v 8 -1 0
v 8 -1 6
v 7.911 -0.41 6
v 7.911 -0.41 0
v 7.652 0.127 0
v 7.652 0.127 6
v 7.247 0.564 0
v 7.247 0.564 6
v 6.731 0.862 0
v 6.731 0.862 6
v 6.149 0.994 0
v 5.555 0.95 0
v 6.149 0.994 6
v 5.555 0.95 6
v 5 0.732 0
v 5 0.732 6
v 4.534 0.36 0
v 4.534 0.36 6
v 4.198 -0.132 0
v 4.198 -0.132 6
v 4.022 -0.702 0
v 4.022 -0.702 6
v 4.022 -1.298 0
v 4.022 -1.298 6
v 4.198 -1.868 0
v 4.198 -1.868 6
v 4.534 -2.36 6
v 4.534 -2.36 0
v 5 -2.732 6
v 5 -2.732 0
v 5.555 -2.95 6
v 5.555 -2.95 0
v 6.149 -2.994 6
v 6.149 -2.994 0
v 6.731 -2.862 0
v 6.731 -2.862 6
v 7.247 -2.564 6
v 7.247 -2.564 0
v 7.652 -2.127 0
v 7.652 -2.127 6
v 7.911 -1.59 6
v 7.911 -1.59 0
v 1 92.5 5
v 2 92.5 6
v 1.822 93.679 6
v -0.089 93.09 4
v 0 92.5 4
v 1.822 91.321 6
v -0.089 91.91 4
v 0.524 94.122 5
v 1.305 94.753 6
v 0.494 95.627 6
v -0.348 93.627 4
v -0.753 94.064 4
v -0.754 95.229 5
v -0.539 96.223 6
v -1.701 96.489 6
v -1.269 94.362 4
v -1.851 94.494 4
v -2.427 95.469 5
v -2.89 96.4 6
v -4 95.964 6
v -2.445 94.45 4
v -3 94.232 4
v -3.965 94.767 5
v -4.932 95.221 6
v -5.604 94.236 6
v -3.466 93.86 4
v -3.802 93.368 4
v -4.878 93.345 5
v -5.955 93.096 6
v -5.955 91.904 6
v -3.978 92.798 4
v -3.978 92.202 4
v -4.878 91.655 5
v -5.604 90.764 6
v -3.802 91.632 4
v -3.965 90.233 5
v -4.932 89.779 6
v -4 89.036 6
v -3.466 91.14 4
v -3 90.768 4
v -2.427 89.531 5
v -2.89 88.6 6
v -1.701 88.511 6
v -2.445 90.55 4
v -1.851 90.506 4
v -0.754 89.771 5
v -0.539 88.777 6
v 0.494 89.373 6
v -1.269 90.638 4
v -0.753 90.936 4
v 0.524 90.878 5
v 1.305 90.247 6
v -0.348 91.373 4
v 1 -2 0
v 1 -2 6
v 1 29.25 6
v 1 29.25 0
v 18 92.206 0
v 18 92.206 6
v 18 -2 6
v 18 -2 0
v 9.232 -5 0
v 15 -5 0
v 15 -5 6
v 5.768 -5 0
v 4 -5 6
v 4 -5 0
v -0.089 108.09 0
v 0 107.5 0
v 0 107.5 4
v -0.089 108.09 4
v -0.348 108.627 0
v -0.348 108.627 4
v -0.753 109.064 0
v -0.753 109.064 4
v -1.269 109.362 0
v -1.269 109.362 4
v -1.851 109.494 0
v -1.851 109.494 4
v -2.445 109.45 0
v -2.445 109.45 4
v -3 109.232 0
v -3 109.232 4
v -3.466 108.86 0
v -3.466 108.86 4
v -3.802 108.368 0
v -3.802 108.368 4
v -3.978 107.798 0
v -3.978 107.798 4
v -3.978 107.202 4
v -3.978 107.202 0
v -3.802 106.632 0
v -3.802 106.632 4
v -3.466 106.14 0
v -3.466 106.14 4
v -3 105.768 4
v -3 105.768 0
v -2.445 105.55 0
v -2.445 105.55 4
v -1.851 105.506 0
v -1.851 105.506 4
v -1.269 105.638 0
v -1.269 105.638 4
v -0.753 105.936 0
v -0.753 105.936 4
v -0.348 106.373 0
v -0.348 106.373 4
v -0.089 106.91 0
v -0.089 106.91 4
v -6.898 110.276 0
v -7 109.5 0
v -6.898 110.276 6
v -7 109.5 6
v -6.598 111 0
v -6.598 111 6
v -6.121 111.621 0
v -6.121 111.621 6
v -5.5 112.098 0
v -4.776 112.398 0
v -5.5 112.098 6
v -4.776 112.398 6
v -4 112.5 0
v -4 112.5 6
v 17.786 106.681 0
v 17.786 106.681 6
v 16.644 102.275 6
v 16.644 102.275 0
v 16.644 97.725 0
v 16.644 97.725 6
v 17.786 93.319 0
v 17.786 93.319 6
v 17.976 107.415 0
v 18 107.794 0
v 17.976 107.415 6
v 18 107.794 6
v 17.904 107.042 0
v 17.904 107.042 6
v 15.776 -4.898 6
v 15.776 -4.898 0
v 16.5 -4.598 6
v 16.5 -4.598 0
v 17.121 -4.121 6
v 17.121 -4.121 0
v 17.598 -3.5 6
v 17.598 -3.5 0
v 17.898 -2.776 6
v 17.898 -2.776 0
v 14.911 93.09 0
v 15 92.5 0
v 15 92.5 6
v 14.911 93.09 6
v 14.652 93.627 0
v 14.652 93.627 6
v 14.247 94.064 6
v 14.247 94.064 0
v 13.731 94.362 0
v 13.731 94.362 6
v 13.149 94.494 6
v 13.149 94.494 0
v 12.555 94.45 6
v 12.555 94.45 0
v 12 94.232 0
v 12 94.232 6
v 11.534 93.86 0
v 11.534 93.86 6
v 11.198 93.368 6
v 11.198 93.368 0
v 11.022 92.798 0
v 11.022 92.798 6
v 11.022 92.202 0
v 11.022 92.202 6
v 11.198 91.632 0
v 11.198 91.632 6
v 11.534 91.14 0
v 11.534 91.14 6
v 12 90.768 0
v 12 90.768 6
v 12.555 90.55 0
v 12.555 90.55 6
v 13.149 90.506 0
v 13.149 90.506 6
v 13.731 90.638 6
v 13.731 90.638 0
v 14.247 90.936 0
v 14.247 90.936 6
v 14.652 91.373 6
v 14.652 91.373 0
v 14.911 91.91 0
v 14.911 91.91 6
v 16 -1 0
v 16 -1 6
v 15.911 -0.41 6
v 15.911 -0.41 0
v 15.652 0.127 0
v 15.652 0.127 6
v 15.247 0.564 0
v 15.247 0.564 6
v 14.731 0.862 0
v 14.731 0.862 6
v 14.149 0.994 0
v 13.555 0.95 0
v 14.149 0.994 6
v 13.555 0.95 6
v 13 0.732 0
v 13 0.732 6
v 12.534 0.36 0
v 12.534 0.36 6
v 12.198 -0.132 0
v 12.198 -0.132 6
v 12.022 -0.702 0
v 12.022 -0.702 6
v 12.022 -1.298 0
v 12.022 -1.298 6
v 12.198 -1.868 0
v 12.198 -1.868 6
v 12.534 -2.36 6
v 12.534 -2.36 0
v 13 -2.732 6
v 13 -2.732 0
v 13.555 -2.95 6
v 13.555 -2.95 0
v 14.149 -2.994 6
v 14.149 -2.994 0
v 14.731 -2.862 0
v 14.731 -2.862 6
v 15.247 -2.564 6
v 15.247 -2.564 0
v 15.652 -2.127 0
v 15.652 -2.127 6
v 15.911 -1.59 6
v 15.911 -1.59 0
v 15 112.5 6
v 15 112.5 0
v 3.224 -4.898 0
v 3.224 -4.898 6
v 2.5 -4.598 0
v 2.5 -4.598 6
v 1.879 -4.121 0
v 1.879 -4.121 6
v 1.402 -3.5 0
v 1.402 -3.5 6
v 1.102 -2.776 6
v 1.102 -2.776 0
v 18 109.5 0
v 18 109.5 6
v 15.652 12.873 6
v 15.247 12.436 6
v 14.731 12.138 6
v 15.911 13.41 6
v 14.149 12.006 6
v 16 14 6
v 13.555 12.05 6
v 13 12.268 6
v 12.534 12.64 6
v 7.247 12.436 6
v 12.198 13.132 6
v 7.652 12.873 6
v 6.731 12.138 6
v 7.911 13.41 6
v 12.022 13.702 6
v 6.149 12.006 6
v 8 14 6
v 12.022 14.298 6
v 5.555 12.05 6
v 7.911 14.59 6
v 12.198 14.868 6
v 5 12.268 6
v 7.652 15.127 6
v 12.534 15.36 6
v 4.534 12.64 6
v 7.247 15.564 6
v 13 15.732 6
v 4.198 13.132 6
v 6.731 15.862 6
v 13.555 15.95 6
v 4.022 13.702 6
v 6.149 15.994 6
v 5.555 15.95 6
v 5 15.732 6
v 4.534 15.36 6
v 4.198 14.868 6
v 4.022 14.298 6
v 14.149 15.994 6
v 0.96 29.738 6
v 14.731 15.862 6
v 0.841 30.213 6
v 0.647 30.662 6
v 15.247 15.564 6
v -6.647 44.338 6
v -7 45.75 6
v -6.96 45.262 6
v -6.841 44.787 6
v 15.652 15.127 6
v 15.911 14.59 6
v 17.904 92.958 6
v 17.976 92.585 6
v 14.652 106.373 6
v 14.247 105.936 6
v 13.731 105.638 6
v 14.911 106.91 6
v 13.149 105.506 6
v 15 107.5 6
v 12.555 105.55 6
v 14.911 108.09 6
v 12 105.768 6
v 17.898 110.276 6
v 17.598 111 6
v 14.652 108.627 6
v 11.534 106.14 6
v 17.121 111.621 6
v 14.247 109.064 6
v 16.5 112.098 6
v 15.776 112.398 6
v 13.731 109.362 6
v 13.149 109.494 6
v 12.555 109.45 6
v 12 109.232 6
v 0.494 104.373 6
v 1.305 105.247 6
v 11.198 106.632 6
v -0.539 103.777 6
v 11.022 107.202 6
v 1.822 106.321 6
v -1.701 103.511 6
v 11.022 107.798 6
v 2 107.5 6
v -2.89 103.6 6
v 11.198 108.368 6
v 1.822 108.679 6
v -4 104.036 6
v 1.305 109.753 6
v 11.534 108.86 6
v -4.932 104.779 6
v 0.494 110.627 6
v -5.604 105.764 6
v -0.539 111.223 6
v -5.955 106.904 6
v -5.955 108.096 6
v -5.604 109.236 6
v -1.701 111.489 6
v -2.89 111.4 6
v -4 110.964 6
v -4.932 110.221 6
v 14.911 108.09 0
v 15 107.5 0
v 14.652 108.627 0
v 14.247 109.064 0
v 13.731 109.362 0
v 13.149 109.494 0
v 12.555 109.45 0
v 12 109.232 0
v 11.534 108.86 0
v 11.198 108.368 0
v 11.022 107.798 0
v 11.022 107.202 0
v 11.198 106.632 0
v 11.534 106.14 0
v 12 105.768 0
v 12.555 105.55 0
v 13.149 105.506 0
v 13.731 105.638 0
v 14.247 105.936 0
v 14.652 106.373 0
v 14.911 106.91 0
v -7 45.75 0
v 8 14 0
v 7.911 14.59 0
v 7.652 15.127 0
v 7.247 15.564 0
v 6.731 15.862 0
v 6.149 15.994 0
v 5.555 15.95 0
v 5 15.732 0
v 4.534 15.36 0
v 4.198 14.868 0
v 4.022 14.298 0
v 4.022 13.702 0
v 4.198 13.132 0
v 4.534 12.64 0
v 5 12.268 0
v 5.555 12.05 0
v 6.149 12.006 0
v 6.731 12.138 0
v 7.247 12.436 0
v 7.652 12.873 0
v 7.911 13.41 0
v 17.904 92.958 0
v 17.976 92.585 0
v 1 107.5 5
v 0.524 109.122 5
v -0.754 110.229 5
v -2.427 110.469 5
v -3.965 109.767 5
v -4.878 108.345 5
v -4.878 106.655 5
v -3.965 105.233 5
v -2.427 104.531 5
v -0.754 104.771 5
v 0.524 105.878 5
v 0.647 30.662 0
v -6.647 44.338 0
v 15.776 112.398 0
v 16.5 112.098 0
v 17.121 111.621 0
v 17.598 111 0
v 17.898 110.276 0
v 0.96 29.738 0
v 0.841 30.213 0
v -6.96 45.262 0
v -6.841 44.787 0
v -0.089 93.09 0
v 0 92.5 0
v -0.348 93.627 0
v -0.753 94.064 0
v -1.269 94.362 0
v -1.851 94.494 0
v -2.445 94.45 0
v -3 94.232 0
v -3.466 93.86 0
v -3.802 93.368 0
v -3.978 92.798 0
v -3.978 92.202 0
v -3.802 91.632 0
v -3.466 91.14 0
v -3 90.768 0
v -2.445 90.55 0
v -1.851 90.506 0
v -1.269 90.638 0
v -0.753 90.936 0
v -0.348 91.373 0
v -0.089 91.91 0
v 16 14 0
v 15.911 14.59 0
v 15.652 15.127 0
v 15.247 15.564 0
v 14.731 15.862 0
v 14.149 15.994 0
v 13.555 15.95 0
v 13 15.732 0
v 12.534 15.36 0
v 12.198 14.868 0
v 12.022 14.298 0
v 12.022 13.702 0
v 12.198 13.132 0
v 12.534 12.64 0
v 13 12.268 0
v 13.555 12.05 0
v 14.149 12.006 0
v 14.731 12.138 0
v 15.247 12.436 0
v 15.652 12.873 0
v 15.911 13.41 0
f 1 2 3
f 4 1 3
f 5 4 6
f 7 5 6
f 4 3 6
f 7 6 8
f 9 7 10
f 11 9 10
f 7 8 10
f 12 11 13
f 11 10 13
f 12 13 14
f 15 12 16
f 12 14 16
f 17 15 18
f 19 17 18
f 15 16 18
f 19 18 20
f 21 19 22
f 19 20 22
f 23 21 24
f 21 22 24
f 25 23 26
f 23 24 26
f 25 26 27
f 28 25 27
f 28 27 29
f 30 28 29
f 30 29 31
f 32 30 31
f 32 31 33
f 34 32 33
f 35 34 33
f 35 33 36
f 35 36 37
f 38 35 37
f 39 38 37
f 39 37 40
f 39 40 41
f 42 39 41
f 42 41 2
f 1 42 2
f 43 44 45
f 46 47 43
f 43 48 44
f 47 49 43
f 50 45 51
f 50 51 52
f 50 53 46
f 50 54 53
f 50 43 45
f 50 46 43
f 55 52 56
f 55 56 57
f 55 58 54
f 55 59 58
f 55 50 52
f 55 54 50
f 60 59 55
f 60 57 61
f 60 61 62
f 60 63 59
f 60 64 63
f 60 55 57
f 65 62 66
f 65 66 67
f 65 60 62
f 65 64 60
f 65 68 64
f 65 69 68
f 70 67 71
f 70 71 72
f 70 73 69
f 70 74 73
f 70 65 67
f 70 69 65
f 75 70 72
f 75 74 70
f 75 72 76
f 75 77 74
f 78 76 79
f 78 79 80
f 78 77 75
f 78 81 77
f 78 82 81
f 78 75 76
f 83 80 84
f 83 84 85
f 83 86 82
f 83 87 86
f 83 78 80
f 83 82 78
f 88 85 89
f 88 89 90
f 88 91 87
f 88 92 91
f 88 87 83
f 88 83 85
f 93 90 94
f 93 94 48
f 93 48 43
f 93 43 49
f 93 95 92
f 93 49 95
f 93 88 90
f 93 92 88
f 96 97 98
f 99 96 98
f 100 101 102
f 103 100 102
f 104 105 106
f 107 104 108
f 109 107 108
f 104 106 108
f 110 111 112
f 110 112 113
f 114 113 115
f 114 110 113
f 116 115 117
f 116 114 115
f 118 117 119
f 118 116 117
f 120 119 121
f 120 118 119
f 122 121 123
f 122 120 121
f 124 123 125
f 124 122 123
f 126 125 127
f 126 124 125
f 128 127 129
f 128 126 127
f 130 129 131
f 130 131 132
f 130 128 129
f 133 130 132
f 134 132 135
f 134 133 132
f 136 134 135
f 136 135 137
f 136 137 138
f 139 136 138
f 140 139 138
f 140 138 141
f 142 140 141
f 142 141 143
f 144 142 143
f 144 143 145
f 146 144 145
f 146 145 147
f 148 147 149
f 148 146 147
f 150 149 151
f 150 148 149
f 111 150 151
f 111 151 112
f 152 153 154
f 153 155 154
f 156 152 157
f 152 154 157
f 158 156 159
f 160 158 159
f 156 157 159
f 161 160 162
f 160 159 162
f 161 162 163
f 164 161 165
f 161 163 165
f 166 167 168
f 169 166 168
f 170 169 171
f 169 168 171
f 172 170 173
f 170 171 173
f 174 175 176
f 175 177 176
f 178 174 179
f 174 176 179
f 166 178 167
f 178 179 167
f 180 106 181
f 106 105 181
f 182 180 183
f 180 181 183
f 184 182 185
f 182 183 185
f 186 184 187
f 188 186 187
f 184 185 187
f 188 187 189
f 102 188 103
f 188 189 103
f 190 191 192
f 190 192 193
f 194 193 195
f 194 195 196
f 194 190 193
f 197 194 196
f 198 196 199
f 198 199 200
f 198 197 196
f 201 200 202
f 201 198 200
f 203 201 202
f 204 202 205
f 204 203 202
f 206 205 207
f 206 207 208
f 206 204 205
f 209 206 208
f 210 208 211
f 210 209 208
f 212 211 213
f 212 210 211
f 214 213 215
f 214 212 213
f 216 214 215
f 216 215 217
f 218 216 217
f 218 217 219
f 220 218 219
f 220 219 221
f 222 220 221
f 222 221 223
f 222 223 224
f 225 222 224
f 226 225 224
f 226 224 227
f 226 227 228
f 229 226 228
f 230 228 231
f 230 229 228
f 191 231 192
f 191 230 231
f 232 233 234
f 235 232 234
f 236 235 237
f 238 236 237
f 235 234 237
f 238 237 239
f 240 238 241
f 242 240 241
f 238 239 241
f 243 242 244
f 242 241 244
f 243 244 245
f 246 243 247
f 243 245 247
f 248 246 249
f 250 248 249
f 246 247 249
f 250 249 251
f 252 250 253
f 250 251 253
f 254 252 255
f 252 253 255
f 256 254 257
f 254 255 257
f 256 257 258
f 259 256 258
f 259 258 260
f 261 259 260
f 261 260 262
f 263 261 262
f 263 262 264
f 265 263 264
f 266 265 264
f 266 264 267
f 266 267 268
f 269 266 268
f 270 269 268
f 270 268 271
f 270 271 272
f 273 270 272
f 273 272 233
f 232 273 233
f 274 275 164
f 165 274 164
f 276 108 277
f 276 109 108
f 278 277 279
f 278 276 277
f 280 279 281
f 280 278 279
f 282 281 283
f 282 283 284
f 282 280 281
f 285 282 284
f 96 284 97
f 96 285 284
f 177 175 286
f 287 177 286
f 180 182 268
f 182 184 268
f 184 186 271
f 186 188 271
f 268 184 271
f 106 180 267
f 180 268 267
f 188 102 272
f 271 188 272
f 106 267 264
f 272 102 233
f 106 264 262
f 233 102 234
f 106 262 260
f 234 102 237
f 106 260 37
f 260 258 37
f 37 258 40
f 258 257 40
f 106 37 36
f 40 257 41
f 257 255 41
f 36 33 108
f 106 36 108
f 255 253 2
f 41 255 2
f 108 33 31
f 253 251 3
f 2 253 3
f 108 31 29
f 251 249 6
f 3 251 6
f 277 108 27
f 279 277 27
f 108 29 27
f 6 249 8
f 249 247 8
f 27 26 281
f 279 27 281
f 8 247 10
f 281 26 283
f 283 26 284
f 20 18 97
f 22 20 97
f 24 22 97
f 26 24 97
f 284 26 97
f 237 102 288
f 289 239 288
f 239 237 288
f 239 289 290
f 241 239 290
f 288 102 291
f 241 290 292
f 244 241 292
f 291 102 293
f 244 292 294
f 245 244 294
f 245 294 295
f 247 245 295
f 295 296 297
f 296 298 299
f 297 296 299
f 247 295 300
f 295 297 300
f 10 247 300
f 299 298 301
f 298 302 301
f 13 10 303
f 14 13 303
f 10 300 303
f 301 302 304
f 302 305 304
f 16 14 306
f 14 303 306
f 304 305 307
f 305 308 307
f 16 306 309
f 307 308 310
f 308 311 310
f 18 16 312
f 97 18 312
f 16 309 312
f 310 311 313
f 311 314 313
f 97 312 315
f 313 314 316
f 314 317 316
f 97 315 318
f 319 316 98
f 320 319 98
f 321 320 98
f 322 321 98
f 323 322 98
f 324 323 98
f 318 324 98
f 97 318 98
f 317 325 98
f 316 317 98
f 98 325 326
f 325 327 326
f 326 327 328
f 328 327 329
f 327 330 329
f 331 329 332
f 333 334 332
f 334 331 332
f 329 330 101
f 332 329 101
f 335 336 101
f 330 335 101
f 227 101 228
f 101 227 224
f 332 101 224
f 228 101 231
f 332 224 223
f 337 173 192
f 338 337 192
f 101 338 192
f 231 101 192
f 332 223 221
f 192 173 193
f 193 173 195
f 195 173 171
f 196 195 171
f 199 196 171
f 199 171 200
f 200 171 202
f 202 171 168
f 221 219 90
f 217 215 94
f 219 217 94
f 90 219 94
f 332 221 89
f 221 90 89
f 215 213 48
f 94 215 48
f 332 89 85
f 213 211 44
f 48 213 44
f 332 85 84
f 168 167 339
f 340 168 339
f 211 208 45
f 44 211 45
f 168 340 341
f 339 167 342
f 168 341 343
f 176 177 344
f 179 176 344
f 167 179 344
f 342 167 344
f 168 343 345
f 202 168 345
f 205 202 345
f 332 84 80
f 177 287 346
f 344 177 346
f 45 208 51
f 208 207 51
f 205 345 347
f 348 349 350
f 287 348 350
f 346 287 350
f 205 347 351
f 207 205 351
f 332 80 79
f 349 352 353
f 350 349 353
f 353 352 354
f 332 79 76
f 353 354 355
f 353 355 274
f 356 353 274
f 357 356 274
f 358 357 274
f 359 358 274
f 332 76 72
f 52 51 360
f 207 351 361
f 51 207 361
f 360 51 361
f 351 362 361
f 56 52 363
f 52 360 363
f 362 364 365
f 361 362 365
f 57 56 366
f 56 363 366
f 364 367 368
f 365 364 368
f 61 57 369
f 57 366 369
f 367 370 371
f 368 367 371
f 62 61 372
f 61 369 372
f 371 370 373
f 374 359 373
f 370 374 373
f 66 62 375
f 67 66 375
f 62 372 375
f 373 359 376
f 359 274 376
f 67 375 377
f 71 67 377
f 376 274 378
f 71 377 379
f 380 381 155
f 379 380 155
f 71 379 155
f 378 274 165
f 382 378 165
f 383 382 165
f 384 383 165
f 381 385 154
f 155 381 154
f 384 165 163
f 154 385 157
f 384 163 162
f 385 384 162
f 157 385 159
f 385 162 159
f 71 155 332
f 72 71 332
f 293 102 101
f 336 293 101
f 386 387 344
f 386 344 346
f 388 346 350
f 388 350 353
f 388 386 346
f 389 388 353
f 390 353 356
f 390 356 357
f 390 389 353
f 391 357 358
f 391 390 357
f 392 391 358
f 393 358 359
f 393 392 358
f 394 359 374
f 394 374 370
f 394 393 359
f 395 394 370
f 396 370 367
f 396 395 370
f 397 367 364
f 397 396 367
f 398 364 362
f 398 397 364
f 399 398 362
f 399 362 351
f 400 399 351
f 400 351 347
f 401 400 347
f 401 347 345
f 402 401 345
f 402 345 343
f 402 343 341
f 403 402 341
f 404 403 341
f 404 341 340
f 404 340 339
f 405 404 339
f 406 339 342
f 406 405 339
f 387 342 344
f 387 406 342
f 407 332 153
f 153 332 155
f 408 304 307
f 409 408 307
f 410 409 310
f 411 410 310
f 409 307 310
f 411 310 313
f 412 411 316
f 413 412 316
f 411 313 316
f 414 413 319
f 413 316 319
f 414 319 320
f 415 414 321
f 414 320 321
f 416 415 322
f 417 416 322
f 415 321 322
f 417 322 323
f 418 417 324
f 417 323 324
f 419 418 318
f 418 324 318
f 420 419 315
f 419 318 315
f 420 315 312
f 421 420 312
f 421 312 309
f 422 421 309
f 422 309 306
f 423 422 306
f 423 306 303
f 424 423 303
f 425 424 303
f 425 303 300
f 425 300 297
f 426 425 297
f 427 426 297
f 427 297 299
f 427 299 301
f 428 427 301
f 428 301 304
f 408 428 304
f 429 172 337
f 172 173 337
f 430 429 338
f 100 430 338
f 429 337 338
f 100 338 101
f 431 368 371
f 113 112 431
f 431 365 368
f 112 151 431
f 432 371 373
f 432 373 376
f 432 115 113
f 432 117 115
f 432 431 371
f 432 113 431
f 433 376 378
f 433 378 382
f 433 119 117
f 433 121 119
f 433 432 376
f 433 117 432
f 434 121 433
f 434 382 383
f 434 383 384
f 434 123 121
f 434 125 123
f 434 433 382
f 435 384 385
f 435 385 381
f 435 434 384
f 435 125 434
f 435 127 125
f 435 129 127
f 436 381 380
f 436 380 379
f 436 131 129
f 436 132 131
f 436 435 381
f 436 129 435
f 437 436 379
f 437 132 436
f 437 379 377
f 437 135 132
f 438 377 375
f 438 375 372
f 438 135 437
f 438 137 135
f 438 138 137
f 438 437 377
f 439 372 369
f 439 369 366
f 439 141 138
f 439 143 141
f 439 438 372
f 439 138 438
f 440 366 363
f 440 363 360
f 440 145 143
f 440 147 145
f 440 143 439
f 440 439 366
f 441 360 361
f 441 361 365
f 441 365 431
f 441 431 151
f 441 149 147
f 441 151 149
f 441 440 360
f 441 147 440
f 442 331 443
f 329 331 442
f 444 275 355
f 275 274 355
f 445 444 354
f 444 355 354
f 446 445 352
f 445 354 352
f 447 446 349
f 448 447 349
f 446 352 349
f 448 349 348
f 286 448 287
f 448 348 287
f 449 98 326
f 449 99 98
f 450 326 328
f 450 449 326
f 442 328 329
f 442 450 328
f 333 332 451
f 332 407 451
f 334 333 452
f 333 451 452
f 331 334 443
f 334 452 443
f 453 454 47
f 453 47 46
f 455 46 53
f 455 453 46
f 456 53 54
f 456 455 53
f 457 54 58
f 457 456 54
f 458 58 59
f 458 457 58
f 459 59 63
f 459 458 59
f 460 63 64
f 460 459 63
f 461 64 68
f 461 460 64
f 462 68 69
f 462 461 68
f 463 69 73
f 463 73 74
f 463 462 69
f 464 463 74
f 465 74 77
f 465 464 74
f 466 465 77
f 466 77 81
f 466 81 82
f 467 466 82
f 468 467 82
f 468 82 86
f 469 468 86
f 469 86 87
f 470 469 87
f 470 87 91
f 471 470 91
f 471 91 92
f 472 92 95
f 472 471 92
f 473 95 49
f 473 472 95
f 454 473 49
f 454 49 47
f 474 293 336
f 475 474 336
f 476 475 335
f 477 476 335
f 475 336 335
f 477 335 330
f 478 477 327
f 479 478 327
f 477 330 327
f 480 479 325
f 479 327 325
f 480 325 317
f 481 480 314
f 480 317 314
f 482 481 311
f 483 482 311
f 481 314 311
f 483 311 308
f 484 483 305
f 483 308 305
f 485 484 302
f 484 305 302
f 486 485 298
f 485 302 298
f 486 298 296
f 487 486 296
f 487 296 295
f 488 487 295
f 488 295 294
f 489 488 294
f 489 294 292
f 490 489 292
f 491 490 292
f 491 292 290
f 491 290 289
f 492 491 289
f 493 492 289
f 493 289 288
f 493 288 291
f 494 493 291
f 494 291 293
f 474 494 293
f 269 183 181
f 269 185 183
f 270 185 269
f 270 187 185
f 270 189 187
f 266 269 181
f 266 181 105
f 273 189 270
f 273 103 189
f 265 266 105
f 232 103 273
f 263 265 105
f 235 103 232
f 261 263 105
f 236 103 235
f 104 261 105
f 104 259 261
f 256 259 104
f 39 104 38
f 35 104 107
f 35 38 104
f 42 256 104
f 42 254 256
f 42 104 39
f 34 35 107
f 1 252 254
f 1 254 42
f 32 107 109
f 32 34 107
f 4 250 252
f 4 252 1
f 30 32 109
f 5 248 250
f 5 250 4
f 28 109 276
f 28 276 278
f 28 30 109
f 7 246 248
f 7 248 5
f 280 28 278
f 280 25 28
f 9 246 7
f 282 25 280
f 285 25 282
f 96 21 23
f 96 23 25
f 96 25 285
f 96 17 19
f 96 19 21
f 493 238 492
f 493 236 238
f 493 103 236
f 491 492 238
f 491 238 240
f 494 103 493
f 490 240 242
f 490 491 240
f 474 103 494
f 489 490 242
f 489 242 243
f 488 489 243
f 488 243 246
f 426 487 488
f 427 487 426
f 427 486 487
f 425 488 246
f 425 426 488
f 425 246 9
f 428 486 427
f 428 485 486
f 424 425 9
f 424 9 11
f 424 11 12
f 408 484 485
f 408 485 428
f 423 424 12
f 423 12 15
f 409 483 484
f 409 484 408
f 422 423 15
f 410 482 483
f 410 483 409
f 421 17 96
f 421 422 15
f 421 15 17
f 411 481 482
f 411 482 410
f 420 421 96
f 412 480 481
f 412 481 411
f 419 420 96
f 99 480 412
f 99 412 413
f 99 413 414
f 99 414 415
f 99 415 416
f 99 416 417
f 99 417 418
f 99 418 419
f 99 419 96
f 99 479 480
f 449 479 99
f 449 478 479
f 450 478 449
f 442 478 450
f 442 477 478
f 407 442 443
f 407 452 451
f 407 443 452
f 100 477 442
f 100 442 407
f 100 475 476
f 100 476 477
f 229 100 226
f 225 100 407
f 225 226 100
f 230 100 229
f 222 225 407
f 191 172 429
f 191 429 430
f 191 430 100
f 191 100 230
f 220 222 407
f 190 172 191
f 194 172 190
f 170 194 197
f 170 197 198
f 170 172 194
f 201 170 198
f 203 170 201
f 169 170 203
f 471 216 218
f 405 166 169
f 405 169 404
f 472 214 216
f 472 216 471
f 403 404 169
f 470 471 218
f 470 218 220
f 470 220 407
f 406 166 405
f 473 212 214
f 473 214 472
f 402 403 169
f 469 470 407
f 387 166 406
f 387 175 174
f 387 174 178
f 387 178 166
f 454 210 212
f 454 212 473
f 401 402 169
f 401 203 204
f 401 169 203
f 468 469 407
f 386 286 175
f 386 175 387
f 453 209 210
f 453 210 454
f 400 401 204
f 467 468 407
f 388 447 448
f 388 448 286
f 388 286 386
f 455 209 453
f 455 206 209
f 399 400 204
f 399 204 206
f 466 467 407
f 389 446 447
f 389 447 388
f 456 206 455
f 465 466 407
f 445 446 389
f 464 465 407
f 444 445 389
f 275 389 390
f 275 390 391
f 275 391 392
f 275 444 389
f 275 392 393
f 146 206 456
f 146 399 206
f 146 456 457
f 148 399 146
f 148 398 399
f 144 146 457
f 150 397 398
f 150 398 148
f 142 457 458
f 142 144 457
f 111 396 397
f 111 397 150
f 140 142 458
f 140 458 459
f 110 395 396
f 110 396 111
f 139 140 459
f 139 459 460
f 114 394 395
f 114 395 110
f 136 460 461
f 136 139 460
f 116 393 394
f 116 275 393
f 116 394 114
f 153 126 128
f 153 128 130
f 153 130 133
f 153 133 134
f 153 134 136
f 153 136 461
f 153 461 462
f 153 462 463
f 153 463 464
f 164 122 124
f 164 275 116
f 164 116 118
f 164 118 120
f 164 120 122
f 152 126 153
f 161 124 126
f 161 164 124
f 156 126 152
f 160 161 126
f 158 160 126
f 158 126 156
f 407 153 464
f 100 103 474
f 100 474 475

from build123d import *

# Parameters (mm, degrees)
SKETCH_1_R          = 2
EXTRUDE_1_DEPTH     = 6
SKETCH_2_R          = 18
CUT_EXTRUDE_1_DEPTH = 6
SKETCH_3_W          = 2
SKETCH_3_H          = 20
SKETCH_3_W_2        = 23
SKETCH_3_H_2        = 10
CUT_EXTRUDE_2_DEPTH = 10
CUT_EXTRUDE_3_DEPTH = 10
EXTRUDE_2_DEPTH     = 6
SKETCH_6_W          = 15.770181782
SKETCH_6_H          = 14.407317349
EXTRUDE_3_DEPTH     = 6
SKETCH_7_R          = 2
CUT_EXTRUDE_4_DEPTH = 10
FILLET_1_R          = 3
SKETCH_8_R          = 2
CUT_EXTRUDE_5_DEPTH = 10
SKETCH_9_W          = 8
SKETCH_9_H          = 35
CUT_EXTRUDE_6_DEPTH = 10
CUT_EXTRUDE_7_DEPTH = 10
FILLET_2_R          = 3
CHAMFER_1_SIZE      = 2


with BuildPart() as part:
    # 草图1 → 凸台-拉伸1 (new body)
    with BuildSketch(Plane.XY):
        Polygon((12.5, 15), (18, 87.5), (18, 112.5), (-7, 112.5), (-7, 87.5), (-10.5, 15), (-12.5, 15), (-12.5, -15), (12.5, -15), align=None)
        with Locations((7.5, -6)):
            Circle(SKETCH_1_R, mode=Mode.SUBTRACT)
        with Locations((13, 92.5)):
            Circle(SKETCH_1_R, mode=Mode.SUBTRACT)
        with Locations((13, 107.5)):
            Circle(SKETCH_1_R, mode=Mode.SUBTRACT)
        with Locations((-2, 107.5)):
            Circle(SKETCH_1_R, mode=Mode.SUBTRACT)
        with Locations((7.5, 6)):
            Circle(SKETCH_1_R, mode=Mode.SUBTRACT)
        with Locations((-2, 92.5)):
            Circle(SKETCH_1_R, mode=Mode.SUBTRACT)
        with Locations((-0.5, 6)):
            Circle(SKETCH_1_R, mode=Mode.SUBTRACT)
        with Locations((-0.5, -6)):
            Circle(SKETCH_1_R, mode=Mode.SUBTRACT)
    extrude(amount=EXTRUDE_1_DEPTH)

    # 草图2 → 切除-拉伸1 (cut)
    with BuildSketch(Plane.XY.offset(6)):
        with Locations((34.5, 100)):
            Circle(SKETCH_2_R)
    extrude(amount=-CUT_EXTRUDE_1_DEPTH, mode=Mode.SUBTRACT)

    # 草图3 → 切除-拉伸2 (cut)
    with BuildSketch(Plane.XY.offset(6)):
        with Locations((-11.5, 5)):
            Rectangle(SKETCH_3_W, SKETCH_3_H)
        with Locations((1, -10)):
            Rectangle(SKETCH_3_W_2, SKETCH_3_H_2)
        with Locations((-11.5, -10)):
            Rectangle(SKETCH_3_W, SKETCH_3_H_2)
    extrude(amount=-CUT_EXTRUDE_2_DEPTH, mode=Mode.SUBTRACT)

    # 草图4 → 切除-拉伸3 (cut)
    with BuildSketch(Plane.XY.offset(6)):
        Polygon((-7, -5), (-7, 87.5), (-10.5, 15), (-10.5, -5), align=None)
    extrude(amount=-CUT_EXTRUDE_3_DEPTH, mode=Mode.SUBTRACT)

    # 草图5 → 凸台-拉伸2 (add)
    with BuildSketch(Plane.XY.offset(6)):
        Polygon((18, 87.5), (18, -5), (12.5, -5), (12.5, 15), align=None)
    extrude(amount=-EXTRUDE_2_DEPTH)

    # 草图6 → 凸台-拉伸3 (add)
    with BuildSketch(Plane.XY.offset(6)):
        with Locations((3.826559257, 2.203658675)):
            Rectangle(SKETCH_6_W, SKETCH_6_H)
    extrude(amount=-EXTRUDE_3_DEPTH)

    # 草图7 → 切除-拉伸4 (cut)
    with BuildSketch(Plane.XY.offset(6)):
        with Locations((6, -1)):
            Circle(SKETCH_7_R)
        with Locations((6, 14)):
            Circle(SKETCH_7_R)
        with Locations((-2, 14)):
            Circle(SKETCH_7_R)
        with Locations((-2, -1)):
            Circle(SKETCH_7_R)
    extrude(amount=-CUT_EXTRUDE_4_DEPTH, mode=Mode.SUBTRACT)

    # 圆角1
    fillet_1_edges = [part.edges().sort_by_distance(p)[0] for p in [
        (-7, -5, 3),
        (18, -5, 3),
        (-7, 112.5, 3),
        (18, 112.5, 3),
        (18, 107.193747285, 3),
        (18, 92.806252715, 3),
    ]]
    fillet(fillet_1_edges, radius=FILLET_1_R)

    # 草图8 → 切除-拉伸5 (cut)
    with BuildSketch(Plane.XY.offset(6)):
        with Locations((14, 14)):
            Circle(SKETCH_8_R)
        with Locations((14, -1)):
            Circle(SKETCH_8_R)
    extrude(amount=-CUT_EXTRUDE_5_DEPTH, mode=Mode.SUBTRACT)

    # 草图9 → 切除-拉伸6 (cut)
    with BuildSketch(Plane.XY.offset(6)):
        with Locations((-3, 12.5)):
            Rectangle(SKETCH_9_W, SKETCH_9_H)
    extrude(amount=-CUT_EXTRUDE_6_DEPTH, mode=Mode.SUBTRACT)

    # 草图10 → 切除-拉伸7 (cut)
    with BuildSketch(Plane.XY.offset(6)):
        Polygon((1, 30), (-7, 30), (-7, 45), align=None)
    extrude(amount=-CUT_EXTRUDE_7_DEPTH, mode=Mode.SUBTRACT)

    # 圆角2
    fillet_2_edges = [part.edges().sort_by_distance(p)[0] for p in [
        (1, 30, 3),
        (1, -5, 3),
        (-7, 45, 3),
    ]]
    fillet(fillet_2_edges, radius=FILLET_2_R)

    # 倒角1
    chamfer_1_edges = [part.edges().sort_by_distance(p)[0] for p in [
        (-4, 92.5, 6),
        (-4, 107.5, 6),
    ]]
    chamfer(chamfer_1_edges, length=CHAMFER_1_SIZE)


solid = part.part
